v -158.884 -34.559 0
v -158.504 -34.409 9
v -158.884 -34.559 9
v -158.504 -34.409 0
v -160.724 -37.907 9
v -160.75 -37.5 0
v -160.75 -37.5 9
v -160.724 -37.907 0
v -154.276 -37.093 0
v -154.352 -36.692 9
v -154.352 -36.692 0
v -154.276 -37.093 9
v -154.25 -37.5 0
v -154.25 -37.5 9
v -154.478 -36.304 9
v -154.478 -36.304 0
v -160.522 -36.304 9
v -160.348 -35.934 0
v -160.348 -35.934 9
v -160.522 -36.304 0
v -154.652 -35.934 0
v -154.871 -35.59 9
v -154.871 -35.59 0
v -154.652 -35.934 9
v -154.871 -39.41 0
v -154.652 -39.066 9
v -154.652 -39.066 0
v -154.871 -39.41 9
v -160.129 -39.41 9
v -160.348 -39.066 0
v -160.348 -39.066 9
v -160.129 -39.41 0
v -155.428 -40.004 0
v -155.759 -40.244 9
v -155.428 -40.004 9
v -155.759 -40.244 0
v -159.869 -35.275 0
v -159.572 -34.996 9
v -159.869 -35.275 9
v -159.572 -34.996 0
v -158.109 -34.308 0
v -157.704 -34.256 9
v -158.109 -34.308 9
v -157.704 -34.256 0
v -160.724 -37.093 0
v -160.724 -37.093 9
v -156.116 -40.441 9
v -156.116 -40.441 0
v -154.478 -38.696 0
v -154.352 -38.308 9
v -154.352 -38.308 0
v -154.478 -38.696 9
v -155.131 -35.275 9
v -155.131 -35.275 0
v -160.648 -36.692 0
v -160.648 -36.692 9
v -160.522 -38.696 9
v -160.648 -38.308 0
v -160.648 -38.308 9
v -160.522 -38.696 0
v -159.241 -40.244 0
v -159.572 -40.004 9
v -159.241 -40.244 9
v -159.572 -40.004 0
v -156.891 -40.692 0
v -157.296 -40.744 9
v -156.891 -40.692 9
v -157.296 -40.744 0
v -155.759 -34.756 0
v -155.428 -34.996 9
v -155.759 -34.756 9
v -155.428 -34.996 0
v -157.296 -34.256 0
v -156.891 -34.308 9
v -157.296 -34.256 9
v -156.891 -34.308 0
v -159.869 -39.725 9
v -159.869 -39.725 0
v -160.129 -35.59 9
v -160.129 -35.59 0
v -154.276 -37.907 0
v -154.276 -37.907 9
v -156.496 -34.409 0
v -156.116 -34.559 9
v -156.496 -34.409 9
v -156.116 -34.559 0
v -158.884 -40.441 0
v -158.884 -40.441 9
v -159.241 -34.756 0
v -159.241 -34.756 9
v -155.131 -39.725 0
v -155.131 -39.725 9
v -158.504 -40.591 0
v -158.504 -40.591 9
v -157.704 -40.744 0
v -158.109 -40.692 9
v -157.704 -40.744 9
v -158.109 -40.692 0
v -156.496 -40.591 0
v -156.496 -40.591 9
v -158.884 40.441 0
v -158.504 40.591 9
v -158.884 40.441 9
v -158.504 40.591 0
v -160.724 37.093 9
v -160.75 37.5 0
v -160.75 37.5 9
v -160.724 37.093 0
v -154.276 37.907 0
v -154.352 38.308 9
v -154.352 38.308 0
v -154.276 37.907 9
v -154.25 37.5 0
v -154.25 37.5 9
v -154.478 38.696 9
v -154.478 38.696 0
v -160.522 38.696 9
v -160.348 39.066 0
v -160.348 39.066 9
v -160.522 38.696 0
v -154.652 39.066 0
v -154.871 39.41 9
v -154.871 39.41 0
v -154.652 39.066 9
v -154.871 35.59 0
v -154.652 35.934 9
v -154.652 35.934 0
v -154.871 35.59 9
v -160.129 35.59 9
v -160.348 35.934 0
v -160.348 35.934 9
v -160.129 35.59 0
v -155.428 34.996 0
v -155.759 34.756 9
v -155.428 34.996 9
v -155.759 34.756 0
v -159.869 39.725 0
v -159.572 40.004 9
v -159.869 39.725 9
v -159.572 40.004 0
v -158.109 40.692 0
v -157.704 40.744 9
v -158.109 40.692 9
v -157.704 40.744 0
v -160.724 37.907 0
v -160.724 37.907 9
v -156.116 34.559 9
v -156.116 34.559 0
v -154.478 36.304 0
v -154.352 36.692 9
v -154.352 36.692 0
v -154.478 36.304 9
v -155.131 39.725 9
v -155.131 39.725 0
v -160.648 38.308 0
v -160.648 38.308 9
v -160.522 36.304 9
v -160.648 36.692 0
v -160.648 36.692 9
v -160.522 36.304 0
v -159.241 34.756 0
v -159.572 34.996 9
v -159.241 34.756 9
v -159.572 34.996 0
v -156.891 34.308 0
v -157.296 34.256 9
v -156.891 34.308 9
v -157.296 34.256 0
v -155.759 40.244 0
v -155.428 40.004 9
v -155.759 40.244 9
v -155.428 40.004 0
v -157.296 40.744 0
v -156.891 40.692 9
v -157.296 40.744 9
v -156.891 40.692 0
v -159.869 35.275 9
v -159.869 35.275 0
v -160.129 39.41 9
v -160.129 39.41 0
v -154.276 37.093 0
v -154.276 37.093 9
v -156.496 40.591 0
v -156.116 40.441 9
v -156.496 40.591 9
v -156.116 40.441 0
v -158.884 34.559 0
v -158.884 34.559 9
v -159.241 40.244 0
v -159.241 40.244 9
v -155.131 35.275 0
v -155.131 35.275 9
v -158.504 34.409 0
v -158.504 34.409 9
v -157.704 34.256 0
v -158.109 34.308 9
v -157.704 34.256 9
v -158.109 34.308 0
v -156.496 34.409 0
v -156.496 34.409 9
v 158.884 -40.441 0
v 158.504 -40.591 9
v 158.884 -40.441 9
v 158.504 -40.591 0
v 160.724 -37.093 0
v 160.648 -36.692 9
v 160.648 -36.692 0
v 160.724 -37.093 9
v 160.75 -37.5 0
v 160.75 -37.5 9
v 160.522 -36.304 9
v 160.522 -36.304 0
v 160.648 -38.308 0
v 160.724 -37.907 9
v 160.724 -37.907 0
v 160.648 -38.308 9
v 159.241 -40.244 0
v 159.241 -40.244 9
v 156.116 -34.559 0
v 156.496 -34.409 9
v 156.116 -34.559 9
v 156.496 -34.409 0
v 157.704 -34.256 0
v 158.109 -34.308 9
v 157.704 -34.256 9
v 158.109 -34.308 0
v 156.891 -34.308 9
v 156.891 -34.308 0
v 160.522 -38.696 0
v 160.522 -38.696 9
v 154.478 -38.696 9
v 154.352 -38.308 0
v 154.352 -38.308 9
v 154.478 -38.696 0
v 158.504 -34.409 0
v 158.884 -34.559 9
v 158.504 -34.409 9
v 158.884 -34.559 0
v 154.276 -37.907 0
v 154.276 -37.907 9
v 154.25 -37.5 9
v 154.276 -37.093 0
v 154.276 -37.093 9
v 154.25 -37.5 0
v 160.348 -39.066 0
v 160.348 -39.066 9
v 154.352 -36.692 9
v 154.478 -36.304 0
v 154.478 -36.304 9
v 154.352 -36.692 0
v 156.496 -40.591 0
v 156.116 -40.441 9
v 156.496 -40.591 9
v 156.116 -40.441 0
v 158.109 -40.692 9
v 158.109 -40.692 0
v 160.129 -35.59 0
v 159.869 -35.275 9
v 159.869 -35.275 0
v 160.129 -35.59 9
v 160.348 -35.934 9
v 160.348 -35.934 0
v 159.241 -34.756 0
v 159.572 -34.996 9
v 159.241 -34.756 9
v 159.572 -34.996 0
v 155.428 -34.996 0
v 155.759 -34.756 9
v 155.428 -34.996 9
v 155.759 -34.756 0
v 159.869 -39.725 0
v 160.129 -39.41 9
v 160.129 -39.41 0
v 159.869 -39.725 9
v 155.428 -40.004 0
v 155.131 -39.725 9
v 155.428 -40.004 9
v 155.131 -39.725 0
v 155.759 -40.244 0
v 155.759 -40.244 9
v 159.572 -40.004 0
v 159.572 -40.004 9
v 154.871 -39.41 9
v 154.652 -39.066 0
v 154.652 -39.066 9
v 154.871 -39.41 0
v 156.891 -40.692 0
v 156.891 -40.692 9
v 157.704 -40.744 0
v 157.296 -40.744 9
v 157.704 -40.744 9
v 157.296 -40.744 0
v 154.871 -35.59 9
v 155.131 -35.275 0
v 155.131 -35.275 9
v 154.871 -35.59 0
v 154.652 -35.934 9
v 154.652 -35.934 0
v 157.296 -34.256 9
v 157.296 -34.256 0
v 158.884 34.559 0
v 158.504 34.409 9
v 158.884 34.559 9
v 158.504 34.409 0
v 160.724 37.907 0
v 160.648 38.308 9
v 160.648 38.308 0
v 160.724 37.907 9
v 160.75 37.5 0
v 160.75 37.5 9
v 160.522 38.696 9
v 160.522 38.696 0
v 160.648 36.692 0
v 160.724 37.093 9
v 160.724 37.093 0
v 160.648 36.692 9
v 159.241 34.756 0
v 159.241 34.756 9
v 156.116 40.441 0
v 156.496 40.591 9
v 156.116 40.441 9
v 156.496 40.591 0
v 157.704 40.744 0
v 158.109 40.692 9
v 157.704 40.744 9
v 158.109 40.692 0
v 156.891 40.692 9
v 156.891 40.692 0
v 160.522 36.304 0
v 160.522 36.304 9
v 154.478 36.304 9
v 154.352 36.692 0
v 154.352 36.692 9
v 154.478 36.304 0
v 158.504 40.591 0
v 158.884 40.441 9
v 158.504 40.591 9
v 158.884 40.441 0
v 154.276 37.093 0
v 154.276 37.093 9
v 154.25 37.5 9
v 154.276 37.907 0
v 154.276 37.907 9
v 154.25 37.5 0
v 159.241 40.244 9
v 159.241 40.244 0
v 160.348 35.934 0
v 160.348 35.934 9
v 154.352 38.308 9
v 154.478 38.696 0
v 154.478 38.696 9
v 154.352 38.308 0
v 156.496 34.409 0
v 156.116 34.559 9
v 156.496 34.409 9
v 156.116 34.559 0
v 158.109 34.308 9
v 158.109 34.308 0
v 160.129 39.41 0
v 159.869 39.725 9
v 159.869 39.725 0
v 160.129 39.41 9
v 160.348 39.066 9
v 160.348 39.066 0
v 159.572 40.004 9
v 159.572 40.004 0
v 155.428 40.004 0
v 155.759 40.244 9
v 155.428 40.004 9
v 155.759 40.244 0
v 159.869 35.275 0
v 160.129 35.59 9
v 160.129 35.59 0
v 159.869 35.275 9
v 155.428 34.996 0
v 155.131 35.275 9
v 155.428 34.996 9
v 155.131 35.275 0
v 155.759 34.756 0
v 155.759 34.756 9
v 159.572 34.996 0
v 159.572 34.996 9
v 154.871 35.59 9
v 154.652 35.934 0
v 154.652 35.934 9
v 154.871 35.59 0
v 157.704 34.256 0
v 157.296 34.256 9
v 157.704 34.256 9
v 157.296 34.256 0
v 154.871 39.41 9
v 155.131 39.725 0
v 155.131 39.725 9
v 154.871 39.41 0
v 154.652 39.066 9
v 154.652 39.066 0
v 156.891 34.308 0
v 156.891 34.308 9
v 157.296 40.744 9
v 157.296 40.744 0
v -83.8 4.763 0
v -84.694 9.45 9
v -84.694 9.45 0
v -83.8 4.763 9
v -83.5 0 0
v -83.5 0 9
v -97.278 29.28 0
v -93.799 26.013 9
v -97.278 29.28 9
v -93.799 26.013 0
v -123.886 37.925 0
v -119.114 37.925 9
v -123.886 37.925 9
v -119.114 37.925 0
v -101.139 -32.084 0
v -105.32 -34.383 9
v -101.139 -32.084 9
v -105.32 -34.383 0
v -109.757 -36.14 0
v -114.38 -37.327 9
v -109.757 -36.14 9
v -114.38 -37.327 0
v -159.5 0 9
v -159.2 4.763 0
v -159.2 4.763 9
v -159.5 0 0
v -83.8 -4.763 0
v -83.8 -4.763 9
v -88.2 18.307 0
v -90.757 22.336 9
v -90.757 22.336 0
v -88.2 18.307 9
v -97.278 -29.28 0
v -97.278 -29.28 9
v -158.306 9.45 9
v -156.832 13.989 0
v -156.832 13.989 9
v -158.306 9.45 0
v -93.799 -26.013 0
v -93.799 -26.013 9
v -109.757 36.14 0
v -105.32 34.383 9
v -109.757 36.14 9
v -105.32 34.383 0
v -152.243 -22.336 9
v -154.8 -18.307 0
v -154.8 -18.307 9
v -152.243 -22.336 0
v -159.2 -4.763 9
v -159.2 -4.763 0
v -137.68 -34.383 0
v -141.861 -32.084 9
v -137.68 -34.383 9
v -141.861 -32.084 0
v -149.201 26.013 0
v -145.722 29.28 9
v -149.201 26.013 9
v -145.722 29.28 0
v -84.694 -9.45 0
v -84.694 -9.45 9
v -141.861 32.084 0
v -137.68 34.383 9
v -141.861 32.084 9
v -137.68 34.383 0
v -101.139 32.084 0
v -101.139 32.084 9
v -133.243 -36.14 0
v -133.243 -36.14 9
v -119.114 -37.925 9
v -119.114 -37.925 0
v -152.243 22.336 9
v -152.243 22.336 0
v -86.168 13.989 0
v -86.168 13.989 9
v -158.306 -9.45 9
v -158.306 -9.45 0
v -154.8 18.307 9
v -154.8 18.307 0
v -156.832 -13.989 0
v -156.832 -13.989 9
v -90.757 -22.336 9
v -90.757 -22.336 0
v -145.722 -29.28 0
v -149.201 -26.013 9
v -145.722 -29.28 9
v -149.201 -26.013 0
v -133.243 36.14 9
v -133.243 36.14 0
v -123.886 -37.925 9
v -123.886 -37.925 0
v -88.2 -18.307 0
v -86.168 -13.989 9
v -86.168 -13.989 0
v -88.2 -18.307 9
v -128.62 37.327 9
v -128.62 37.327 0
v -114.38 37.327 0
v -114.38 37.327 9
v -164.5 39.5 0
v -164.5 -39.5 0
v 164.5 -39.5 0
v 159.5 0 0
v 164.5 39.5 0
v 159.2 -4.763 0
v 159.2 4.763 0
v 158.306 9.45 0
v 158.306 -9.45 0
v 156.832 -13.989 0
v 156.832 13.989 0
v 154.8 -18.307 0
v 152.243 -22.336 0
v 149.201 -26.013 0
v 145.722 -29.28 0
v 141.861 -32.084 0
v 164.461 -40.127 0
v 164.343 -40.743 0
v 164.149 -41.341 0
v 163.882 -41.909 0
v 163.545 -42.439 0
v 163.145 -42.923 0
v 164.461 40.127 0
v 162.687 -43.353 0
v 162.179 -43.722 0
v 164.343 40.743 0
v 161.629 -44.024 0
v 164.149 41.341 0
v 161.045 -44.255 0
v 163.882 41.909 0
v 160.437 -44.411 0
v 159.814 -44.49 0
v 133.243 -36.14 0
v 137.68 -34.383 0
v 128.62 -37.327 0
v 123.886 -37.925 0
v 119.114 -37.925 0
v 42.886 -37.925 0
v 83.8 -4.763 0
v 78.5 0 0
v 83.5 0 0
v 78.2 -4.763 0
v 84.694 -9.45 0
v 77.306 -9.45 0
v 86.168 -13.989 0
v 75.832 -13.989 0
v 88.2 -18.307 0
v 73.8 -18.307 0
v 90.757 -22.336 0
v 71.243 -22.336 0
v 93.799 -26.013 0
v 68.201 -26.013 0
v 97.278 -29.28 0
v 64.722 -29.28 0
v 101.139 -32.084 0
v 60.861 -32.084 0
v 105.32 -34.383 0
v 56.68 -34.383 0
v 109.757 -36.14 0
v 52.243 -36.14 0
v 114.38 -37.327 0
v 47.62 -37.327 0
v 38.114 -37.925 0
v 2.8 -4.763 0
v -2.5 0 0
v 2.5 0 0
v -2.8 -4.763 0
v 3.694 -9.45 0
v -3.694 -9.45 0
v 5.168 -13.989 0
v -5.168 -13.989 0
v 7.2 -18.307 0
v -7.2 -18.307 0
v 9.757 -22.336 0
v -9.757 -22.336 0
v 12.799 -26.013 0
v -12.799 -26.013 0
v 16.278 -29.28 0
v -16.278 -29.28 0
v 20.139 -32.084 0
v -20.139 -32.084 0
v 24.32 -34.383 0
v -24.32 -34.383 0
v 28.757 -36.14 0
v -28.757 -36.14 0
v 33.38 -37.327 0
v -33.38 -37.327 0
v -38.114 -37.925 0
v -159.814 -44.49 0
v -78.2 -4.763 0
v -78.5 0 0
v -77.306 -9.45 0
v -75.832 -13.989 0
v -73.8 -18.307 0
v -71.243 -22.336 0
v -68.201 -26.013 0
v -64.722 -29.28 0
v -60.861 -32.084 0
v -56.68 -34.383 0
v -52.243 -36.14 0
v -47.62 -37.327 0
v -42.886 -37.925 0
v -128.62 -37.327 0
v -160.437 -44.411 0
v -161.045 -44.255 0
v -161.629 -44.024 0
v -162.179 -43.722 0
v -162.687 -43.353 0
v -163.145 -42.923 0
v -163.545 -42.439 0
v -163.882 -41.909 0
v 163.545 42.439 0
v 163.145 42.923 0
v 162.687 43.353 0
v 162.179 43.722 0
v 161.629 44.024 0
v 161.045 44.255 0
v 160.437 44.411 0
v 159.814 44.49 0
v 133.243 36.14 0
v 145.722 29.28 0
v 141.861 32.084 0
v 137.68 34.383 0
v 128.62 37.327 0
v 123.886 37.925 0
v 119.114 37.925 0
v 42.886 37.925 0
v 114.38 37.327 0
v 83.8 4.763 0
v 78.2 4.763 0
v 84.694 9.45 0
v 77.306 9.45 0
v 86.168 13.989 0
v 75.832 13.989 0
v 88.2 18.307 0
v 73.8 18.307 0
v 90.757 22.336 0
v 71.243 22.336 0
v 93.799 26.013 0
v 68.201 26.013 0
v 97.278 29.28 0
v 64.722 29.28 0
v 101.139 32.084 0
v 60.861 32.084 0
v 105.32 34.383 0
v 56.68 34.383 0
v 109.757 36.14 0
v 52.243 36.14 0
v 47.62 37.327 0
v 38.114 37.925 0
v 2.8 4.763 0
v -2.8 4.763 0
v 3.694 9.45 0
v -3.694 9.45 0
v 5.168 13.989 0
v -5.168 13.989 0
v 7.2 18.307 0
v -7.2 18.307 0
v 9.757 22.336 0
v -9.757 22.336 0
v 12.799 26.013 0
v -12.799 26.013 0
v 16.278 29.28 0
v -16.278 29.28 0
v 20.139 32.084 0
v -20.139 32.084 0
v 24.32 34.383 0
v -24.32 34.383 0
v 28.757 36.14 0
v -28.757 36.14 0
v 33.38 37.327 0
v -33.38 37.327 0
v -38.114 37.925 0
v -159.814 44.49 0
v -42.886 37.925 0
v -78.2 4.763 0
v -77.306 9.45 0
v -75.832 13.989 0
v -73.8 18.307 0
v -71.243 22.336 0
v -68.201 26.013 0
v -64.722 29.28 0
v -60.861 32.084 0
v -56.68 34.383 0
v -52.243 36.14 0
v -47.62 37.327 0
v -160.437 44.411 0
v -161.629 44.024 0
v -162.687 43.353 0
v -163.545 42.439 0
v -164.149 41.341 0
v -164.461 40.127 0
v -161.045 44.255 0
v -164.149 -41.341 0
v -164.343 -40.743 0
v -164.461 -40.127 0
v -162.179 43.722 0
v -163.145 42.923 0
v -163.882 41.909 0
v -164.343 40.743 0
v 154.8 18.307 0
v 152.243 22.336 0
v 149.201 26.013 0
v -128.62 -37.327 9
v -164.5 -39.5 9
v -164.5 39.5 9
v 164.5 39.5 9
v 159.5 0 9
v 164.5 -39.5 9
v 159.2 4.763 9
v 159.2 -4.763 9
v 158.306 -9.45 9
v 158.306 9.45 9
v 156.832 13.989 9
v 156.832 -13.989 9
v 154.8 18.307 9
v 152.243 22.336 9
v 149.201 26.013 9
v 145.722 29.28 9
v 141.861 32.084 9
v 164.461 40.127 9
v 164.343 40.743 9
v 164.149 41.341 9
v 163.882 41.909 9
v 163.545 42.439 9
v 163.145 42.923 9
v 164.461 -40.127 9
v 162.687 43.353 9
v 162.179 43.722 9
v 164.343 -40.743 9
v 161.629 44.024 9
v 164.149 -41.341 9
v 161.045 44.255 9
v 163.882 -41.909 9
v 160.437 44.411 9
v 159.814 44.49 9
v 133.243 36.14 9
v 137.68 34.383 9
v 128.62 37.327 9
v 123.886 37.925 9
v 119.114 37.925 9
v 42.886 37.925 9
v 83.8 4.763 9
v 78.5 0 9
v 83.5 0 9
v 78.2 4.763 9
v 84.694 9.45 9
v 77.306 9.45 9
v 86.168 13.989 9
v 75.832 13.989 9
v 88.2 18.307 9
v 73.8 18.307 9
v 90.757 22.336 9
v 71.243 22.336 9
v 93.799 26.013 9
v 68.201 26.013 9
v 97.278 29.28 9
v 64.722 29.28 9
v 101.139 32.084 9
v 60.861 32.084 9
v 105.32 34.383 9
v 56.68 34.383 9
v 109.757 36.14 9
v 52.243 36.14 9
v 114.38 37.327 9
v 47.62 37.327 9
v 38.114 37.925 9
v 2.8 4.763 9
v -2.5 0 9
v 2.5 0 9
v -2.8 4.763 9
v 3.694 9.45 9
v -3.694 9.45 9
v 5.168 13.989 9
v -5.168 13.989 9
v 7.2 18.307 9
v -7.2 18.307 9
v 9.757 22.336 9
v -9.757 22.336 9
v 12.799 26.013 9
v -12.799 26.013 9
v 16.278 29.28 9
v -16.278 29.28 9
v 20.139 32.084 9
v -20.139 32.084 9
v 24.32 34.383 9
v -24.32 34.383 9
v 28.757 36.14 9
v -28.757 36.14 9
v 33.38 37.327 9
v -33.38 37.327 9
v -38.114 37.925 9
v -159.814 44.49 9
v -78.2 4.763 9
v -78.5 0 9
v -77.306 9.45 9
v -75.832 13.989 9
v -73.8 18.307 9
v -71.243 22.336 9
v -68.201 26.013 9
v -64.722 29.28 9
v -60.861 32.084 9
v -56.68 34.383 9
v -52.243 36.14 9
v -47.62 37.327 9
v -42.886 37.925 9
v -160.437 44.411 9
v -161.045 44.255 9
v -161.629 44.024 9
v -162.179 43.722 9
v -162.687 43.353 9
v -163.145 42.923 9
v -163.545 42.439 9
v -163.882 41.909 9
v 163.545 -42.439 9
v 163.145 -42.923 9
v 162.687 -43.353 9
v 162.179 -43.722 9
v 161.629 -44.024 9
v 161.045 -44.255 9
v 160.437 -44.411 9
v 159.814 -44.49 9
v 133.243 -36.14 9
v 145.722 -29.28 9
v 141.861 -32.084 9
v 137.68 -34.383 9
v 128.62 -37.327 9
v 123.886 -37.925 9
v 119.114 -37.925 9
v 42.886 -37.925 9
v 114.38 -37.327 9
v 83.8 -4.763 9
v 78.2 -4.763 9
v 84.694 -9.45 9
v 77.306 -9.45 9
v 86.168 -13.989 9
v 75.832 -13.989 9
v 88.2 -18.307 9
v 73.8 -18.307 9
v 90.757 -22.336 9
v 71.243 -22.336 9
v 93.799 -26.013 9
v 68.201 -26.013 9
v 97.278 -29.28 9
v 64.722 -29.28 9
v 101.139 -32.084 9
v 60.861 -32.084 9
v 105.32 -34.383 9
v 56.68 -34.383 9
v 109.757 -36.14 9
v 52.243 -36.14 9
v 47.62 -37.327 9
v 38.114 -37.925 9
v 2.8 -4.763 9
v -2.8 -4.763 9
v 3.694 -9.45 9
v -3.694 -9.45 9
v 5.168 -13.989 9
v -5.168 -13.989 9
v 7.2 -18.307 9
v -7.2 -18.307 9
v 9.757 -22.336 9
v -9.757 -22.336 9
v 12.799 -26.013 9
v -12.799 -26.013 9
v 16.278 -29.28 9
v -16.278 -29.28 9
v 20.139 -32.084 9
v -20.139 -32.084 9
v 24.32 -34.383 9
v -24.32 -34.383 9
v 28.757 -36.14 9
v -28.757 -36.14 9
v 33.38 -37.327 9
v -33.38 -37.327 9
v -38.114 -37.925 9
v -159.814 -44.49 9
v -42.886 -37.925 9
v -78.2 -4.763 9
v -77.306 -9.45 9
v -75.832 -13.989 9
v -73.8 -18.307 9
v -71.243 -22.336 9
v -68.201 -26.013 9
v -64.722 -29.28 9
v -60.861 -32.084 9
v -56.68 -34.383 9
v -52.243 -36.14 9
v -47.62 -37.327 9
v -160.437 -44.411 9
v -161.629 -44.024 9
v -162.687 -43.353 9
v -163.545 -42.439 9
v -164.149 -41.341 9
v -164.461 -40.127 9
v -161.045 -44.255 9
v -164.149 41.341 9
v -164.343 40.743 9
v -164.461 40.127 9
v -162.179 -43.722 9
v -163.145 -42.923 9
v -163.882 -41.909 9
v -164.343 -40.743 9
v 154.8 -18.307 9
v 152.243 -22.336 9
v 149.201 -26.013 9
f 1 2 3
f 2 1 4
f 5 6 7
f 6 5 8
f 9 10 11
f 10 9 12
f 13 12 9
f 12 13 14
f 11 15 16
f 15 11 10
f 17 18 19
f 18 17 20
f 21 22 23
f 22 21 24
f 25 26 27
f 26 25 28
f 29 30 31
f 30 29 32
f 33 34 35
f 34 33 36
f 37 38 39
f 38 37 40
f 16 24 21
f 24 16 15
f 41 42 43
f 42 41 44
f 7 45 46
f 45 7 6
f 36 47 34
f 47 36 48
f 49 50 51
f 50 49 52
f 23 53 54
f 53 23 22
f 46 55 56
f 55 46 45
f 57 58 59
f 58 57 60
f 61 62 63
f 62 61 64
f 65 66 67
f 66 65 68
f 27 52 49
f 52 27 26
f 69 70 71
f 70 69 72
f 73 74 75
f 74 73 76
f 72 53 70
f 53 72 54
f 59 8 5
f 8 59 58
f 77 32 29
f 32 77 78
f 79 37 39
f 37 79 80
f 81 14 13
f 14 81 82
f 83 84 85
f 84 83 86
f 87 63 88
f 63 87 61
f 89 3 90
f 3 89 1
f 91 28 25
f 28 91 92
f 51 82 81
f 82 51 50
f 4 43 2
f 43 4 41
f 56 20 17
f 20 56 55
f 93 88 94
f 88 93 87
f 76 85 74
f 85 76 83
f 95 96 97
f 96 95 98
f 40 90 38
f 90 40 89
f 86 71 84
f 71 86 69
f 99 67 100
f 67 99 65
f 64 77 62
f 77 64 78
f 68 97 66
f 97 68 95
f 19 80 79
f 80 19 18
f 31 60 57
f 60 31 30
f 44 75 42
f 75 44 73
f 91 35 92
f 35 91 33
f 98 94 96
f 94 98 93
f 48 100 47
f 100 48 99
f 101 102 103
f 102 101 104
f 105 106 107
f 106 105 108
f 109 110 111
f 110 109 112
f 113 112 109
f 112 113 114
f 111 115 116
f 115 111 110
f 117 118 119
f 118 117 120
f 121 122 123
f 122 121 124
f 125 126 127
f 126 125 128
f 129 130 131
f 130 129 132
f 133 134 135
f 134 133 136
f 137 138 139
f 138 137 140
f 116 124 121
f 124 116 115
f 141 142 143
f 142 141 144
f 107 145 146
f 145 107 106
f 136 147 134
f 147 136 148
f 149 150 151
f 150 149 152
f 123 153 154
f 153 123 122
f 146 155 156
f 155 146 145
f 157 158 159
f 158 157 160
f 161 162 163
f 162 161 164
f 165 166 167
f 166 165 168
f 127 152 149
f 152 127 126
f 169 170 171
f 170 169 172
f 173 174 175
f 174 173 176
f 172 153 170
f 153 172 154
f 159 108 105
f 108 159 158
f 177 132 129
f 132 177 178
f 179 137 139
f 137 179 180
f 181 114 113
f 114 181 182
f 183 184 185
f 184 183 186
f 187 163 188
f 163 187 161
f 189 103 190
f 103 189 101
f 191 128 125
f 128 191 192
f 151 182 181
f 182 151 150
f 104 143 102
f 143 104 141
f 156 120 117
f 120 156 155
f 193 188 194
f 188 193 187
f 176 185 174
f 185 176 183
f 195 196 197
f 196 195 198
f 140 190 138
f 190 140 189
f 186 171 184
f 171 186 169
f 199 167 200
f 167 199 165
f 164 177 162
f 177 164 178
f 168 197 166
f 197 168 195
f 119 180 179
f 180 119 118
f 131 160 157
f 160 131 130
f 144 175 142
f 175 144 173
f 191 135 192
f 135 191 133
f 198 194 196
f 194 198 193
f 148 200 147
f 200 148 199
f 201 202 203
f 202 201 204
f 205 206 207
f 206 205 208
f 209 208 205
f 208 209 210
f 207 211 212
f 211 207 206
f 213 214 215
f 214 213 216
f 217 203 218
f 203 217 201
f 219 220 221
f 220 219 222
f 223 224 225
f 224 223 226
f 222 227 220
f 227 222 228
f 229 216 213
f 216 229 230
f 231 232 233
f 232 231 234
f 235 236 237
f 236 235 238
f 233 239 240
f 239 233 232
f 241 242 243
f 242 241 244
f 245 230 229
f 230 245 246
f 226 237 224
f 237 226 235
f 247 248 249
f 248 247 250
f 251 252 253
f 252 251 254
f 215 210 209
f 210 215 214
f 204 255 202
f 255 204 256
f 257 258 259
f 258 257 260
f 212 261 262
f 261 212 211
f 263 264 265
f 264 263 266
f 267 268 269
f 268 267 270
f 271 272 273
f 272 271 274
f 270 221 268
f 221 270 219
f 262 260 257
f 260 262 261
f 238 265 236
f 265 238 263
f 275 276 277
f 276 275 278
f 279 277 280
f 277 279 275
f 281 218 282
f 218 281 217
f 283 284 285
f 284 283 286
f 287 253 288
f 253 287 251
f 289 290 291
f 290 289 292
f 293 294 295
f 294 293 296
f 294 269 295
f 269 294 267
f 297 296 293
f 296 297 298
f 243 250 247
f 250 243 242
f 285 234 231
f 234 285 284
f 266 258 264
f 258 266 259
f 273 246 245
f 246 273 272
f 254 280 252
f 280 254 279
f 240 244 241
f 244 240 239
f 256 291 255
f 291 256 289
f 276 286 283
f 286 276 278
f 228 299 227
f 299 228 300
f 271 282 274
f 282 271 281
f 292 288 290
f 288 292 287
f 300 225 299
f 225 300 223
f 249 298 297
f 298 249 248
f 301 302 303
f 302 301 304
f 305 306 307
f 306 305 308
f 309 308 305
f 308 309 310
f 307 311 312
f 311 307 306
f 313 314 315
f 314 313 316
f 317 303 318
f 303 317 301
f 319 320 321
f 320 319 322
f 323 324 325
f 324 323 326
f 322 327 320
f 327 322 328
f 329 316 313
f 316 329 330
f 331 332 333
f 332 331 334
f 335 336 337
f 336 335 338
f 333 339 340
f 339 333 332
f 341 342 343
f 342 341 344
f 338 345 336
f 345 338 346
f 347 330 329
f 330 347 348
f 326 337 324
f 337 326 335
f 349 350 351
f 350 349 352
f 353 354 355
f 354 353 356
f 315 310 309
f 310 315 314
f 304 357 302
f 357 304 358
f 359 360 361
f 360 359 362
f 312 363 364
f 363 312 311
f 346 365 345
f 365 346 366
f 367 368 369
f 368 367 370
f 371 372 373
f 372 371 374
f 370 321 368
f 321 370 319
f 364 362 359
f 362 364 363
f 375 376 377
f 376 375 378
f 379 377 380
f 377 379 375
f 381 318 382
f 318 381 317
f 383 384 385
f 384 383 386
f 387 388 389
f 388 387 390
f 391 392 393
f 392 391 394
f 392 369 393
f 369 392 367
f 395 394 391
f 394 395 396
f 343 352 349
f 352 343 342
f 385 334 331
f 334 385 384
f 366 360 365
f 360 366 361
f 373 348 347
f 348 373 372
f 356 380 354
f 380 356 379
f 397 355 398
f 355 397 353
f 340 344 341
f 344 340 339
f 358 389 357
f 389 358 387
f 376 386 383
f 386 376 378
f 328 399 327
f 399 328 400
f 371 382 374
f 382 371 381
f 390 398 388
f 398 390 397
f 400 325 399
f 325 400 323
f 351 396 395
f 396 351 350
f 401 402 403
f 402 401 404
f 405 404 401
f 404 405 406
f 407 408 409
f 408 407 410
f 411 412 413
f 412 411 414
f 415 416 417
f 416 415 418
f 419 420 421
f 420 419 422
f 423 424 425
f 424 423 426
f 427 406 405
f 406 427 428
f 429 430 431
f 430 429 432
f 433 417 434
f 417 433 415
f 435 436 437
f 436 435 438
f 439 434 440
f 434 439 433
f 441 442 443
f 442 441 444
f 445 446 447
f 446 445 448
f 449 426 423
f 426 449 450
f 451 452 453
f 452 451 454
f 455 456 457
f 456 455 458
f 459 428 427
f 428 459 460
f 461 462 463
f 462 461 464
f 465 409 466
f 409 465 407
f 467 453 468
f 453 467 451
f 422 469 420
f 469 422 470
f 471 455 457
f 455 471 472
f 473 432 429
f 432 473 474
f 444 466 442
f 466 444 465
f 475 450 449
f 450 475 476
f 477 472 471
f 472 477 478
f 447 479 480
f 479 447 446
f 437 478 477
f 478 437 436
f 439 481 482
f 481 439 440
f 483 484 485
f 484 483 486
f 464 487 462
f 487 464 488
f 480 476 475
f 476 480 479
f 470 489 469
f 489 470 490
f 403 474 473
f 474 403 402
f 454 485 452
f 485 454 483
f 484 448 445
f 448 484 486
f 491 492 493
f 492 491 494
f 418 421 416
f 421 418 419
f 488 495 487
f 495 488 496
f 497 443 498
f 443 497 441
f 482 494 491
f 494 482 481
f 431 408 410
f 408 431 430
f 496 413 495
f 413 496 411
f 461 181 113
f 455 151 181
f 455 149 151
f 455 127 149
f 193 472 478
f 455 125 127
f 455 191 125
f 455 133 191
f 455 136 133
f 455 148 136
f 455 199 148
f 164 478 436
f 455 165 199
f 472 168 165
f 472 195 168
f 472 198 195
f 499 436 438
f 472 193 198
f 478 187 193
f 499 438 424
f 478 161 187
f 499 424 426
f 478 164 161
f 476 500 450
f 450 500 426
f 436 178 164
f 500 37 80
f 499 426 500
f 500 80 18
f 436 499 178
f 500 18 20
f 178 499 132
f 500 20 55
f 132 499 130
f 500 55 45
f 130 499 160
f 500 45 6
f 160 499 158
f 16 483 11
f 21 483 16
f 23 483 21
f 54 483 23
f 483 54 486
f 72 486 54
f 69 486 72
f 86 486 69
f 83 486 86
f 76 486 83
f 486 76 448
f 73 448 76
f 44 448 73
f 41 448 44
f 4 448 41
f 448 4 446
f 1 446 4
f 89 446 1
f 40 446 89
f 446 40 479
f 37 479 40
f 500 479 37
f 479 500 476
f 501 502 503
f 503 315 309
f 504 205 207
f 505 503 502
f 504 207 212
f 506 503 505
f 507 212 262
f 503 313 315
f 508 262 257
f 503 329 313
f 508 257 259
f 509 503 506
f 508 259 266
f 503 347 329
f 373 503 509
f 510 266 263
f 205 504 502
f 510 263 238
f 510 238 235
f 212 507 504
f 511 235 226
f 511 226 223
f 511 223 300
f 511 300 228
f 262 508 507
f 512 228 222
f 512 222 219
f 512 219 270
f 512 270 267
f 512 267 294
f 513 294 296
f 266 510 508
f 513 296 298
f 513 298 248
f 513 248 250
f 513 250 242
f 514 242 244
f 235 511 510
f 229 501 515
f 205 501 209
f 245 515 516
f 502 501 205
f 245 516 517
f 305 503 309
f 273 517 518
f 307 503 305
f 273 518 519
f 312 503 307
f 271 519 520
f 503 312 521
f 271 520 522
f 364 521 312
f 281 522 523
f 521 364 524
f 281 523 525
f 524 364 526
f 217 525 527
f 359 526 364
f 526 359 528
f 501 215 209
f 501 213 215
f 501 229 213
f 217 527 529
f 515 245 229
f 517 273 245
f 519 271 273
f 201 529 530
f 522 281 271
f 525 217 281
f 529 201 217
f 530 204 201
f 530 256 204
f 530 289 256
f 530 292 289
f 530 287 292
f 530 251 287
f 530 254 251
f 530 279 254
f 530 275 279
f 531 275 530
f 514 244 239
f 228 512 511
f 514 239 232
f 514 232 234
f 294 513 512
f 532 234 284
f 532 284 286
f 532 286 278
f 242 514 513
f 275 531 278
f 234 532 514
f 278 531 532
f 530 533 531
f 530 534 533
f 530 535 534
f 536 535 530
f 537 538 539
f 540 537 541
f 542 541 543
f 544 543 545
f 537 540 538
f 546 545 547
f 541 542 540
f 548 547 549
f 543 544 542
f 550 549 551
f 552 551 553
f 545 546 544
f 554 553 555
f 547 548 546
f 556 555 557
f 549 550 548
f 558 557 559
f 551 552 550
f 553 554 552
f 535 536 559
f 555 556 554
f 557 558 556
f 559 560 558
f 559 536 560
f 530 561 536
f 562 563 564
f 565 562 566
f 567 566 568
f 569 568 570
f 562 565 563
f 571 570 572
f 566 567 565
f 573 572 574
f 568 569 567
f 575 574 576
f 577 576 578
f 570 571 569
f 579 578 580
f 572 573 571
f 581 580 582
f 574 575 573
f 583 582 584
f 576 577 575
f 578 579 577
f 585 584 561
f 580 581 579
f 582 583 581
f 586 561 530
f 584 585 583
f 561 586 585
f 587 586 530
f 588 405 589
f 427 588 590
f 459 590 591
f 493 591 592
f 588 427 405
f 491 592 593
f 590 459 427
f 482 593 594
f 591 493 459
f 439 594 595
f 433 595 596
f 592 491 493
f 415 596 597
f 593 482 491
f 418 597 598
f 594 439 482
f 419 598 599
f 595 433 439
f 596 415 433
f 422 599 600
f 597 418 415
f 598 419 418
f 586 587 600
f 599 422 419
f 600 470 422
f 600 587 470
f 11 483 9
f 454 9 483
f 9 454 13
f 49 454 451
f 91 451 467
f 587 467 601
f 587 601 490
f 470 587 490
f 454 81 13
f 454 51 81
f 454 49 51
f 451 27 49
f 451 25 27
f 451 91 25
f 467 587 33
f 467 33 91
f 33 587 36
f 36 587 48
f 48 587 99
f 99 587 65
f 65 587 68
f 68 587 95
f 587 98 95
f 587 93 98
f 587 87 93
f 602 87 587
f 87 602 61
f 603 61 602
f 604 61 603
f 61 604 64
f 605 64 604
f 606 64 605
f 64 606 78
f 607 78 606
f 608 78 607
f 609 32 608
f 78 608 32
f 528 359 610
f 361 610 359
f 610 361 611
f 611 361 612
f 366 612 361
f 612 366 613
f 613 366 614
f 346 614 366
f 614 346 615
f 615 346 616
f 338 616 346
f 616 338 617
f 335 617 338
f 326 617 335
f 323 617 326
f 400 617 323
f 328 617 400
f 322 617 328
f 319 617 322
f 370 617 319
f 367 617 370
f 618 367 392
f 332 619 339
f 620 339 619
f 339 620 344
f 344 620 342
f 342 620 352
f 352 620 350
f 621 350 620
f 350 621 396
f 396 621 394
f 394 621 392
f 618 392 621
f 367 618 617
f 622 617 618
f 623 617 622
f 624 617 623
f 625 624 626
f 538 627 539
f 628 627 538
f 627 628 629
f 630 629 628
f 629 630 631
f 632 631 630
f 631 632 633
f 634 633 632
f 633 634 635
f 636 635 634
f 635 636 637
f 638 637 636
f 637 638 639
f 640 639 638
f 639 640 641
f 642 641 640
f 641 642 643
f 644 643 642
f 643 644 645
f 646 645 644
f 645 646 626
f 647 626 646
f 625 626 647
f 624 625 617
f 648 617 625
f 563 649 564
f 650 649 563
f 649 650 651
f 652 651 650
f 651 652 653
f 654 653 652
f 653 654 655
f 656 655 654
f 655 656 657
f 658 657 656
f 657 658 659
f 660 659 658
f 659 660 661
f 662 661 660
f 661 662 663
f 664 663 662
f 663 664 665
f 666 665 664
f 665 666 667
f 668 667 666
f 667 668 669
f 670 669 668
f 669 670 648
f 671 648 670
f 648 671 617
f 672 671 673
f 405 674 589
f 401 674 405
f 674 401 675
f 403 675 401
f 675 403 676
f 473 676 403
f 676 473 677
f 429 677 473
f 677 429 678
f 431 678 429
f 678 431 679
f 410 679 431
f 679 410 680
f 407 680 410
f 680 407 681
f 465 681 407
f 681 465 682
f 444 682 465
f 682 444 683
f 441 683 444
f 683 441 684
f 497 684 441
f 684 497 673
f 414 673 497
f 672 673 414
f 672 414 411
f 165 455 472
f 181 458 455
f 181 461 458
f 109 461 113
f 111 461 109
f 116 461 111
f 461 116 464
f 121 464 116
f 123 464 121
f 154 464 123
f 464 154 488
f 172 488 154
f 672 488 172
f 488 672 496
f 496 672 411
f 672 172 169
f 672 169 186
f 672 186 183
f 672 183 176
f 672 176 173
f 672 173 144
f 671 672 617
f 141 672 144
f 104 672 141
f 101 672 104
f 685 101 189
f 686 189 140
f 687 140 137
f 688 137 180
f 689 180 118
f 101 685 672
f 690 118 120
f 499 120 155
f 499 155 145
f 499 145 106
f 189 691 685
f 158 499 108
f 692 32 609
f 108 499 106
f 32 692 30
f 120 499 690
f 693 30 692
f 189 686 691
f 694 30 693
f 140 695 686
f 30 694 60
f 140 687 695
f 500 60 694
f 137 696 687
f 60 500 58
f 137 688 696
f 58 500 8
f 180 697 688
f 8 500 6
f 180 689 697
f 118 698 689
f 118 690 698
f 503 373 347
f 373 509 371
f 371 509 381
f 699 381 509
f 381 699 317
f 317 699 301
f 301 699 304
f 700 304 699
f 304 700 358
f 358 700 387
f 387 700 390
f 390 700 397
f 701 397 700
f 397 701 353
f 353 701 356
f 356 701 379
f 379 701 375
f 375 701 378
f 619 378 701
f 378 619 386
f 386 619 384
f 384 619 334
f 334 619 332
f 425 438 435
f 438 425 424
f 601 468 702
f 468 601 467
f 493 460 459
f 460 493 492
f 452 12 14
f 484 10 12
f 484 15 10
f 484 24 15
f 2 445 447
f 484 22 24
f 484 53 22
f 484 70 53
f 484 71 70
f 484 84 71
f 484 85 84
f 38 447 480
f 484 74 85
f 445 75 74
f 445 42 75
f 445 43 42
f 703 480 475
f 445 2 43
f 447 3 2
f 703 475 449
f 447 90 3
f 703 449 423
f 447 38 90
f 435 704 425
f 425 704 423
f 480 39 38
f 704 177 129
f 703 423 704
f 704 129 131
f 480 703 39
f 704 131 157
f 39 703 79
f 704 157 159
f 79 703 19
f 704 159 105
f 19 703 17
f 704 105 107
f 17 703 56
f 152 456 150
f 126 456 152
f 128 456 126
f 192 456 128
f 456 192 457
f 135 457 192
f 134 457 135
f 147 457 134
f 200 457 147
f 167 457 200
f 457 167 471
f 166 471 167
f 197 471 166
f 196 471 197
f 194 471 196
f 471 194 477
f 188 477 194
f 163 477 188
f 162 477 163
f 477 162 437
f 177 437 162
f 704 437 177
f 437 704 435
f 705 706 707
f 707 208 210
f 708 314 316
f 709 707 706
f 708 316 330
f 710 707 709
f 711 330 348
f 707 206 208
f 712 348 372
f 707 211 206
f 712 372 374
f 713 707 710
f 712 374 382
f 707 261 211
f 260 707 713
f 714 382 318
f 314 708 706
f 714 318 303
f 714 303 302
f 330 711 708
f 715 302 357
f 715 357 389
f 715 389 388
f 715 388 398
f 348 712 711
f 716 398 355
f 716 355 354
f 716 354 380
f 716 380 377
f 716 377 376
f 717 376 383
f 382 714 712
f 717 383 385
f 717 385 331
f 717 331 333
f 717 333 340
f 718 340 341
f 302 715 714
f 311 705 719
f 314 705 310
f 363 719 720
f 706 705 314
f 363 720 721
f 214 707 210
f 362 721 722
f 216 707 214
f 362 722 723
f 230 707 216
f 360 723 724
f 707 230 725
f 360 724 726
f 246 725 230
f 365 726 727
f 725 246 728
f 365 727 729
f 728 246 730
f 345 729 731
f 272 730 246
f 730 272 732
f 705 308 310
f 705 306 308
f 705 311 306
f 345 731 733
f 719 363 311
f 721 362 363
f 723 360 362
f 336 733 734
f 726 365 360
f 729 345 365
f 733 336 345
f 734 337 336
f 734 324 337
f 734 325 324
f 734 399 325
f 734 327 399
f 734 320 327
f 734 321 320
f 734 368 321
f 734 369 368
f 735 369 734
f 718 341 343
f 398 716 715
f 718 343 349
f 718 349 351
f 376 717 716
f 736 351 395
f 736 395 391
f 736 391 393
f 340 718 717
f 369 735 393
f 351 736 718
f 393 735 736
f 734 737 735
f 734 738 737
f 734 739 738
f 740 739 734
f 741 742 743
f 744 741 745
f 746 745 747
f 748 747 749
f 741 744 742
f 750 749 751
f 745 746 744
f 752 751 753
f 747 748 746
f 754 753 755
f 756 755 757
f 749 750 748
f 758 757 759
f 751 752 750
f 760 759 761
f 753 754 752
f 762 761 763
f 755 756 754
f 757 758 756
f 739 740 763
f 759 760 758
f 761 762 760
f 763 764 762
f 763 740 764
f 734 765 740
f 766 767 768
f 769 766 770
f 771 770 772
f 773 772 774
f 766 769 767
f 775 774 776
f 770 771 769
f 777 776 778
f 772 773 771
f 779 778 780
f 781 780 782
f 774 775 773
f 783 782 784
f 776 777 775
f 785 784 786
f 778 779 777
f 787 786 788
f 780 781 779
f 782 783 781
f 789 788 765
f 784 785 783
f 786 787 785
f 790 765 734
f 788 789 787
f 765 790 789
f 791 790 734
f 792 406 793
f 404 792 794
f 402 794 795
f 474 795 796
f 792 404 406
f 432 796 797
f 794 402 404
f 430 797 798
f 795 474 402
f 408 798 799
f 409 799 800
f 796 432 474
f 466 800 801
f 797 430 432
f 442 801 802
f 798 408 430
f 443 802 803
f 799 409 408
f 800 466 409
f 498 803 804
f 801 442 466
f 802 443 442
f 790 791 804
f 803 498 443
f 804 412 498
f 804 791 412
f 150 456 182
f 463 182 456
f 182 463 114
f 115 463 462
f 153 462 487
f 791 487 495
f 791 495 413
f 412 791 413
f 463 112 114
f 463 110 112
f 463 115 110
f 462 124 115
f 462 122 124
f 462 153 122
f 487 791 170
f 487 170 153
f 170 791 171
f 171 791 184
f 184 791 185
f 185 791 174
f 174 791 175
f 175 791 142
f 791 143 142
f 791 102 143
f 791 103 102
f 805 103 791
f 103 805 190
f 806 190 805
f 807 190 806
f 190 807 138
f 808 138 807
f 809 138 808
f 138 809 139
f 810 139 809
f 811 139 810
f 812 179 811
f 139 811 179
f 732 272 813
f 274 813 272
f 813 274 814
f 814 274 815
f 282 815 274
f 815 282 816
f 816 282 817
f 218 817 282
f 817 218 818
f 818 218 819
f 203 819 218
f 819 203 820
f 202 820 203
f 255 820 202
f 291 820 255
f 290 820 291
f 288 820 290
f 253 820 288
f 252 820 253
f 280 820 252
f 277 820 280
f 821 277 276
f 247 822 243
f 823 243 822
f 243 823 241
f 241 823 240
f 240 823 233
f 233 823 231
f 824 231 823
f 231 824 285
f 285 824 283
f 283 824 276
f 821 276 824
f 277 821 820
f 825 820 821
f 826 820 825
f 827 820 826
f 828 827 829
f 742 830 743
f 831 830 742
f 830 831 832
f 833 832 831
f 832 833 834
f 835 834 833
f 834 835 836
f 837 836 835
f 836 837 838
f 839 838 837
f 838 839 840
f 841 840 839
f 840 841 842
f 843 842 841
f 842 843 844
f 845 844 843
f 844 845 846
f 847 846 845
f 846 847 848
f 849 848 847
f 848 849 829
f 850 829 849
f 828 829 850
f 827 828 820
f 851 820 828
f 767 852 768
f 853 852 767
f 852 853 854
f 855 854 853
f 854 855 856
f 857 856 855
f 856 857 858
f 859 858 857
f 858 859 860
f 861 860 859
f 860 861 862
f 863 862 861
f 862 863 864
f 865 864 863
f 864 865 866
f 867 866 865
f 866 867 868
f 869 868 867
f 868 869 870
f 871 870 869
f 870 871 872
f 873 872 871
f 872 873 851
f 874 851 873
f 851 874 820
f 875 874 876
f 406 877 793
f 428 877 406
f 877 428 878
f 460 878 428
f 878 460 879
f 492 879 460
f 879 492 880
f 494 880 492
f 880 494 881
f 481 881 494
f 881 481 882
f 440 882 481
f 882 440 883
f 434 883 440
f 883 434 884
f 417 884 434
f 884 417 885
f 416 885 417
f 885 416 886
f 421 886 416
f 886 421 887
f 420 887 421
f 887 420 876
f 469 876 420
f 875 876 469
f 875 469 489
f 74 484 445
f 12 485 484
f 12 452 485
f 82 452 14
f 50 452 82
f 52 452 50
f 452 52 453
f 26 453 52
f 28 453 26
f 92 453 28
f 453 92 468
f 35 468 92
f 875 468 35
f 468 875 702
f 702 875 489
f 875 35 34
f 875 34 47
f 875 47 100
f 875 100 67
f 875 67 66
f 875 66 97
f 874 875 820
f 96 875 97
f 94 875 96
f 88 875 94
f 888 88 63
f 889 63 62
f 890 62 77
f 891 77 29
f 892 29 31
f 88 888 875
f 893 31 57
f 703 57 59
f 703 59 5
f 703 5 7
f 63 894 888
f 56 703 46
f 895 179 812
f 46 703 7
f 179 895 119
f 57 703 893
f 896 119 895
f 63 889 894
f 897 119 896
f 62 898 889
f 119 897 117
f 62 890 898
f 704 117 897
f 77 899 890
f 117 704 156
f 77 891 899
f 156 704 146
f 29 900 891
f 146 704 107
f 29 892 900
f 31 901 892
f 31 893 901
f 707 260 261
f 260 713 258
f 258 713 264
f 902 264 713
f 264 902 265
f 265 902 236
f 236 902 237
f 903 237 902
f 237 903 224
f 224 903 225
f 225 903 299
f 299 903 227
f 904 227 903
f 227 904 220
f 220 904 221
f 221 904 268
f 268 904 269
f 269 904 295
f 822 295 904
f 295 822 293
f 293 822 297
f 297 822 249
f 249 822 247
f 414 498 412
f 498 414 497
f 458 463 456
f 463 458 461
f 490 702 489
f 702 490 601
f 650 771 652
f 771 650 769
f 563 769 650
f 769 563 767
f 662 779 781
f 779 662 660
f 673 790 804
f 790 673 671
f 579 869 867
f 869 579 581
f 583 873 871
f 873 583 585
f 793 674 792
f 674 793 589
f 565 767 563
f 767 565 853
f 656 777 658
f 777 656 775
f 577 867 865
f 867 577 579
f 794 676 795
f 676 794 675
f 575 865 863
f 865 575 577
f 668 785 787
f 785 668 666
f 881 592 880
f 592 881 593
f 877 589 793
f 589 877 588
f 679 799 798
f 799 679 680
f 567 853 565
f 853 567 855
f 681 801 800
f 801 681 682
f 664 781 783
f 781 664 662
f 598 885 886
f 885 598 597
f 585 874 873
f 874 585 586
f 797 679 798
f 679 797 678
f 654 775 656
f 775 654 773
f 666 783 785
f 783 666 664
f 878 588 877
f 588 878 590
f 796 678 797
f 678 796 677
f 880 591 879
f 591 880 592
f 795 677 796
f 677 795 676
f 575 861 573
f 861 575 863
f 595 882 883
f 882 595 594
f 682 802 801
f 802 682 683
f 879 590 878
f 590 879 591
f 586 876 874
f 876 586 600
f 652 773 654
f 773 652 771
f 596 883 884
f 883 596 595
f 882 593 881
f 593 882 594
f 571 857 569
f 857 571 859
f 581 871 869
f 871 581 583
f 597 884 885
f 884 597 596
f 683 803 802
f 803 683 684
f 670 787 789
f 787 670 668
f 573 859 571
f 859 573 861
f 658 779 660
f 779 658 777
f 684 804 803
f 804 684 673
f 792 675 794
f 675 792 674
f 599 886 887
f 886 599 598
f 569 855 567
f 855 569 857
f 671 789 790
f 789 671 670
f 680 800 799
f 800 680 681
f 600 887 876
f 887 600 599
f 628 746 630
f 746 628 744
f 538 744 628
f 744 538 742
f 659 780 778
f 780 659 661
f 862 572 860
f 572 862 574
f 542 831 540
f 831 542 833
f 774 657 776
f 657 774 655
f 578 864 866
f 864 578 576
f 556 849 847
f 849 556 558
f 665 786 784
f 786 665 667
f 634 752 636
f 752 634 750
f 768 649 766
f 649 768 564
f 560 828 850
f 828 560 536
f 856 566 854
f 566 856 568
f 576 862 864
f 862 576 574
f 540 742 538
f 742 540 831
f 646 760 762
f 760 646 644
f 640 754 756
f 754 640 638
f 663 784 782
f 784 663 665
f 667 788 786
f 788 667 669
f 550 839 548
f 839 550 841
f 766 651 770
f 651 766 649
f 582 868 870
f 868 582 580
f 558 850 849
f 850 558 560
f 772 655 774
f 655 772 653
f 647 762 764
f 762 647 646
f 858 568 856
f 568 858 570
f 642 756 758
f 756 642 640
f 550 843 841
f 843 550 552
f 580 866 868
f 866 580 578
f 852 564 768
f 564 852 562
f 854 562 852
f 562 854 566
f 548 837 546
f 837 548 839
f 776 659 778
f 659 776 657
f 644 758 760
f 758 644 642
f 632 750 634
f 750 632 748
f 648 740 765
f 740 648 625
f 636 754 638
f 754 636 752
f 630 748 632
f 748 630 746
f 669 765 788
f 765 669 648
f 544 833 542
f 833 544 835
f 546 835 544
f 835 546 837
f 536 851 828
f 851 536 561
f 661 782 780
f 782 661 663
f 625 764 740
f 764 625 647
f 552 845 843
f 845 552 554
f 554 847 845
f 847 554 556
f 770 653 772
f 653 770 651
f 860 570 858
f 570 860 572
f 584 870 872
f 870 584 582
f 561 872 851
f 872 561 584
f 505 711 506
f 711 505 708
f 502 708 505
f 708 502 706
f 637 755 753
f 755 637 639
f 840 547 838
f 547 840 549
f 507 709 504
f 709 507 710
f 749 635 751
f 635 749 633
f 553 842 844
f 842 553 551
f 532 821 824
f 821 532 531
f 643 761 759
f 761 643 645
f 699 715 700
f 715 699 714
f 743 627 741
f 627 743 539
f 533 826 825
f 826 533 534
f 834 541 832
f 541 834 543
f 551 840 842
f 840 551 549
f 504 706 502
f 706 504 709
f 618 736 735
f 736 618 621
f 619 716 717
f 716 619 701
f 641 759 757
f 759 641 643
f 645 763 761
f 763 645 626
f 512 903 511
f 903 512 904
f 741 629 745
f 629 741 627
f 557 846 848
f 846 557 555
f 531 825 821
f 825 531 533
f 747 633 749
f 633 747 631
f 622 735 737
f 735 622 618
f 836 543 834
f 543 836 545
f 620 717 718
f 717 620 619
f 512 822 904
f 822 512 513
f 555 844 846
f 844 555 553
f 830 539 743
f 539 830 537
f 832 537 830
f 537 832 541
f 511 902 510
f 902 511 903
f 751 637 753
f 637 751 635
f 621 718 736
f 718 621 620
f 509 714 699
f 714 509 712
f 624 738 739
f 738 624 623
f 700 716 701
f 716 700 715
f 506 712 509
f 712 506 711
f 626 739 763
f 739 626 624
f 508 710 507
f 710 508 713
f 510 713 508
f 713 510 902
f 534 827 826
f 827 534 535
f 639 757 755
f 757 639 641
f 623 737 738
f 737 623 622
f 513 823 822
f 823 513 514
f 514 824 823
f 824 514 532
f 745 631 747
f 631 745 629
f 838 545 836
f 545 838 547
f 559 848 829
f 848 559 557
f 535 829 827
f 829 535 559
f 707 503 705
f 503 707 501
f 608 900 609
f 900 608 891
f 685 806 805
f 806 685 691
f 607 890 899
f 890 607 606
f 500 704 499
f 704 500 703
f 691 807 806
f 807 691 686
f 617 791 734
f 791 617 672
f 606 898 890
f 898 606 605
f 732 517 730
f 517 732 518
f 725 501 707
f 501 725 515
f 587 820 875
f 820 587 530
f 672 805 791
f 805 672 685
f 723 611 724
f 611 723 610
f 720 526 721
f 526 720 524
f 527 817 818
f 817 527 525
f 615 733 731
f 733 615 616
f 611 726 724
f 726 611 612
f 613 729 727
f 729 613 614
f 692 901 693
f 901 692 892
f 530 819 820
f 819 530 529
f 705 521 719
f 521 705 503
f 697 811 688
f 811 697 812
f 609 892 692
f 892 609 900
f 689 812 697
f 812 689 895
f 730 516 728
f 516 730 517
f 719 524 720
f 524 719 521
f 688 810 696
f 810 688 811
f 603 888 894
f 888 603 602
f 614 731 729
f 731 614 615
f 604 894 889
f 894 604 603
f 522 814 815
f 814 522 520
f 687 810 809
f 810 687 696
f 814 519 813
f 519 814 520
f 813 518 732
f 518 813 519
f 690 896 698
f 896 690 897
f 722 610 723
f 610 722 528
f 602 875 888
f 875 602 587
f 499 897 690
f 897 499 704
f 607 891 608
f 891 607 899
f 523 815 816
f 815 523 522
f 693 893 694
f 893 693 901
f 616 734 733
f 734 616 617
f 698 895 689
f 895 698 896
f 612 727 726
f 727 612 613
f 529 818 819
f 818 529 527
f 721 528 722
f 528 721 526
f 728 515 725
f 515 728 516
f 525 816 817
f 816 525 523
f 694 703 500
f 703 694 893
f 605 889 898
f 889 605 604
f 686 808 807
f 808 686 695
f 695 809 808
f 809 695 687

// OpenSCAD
$fn = 50;

difference() {
	union() {
		hull() {
			translate(v = [-159.5, 39.5, 0]) {
				cylinder(h = 9, r = 5);
			}
			translate(v = [159.5, 39.5, 0]) {
				cylinder(h = 9, r = 5);
			}
			translate(v = [-159.5, -39.5, 0]) {
				cylinder(h = 9, r = 5);
			}
			translate(v = [159.5, -39.5, 0]) {
				cylinder(h = 9, r = 5);
			}
		}
	}
	union() {
		translate(v = [-157.5, -37.5, -100.0]) {
			cylinder(h = 200, r = 3.25);
		}
		translate(v = [-157.5, 37.5, -100.0]) {
			cylinder(h = 200, r = 3.25);
		}
		translate(v = [157.5, -37.5, -100.0]) {
			cylinder(h = 200, r = 3.25);
		}
		translate(v = [157.5, 37.5, -100.0]) {
			cylinder(h = 200, r = 3.25);
		}
		translate(v = [-157.5, -37.5, -100.0]) {
			cylinder(h = 200, r = 1.8);
		}
		translate(v = [-157.5, 37.5, -100.0]) {
			cylinder(h = 200, r = 1.8);
		}
		translate(v = [157.5, -37.5, -100.0]) {
			cylinder(h = 200, r = 1.8);
		}
		translate(v = [157.5, 37.5, -100.0]) {
			cylinder(h = 200, r = 1.8);
		}
		translate(v = [-121.5, 0, 0.0]) {
			cylinder(h = 9, r = 38.0);
		}
		translate(v = [-40.5, 0, 0.0]) {
			cylinder(h = 9, r = 38.0);
		}
		translate(v = [40.5, 0, 0.0]) {
			cylinder(h = 9, r = 38.0);
		}
		translate(v = [121.5, 0, 0.0]) {
			cylinder(h = 9, r = 38.0);
		}
	}
}
